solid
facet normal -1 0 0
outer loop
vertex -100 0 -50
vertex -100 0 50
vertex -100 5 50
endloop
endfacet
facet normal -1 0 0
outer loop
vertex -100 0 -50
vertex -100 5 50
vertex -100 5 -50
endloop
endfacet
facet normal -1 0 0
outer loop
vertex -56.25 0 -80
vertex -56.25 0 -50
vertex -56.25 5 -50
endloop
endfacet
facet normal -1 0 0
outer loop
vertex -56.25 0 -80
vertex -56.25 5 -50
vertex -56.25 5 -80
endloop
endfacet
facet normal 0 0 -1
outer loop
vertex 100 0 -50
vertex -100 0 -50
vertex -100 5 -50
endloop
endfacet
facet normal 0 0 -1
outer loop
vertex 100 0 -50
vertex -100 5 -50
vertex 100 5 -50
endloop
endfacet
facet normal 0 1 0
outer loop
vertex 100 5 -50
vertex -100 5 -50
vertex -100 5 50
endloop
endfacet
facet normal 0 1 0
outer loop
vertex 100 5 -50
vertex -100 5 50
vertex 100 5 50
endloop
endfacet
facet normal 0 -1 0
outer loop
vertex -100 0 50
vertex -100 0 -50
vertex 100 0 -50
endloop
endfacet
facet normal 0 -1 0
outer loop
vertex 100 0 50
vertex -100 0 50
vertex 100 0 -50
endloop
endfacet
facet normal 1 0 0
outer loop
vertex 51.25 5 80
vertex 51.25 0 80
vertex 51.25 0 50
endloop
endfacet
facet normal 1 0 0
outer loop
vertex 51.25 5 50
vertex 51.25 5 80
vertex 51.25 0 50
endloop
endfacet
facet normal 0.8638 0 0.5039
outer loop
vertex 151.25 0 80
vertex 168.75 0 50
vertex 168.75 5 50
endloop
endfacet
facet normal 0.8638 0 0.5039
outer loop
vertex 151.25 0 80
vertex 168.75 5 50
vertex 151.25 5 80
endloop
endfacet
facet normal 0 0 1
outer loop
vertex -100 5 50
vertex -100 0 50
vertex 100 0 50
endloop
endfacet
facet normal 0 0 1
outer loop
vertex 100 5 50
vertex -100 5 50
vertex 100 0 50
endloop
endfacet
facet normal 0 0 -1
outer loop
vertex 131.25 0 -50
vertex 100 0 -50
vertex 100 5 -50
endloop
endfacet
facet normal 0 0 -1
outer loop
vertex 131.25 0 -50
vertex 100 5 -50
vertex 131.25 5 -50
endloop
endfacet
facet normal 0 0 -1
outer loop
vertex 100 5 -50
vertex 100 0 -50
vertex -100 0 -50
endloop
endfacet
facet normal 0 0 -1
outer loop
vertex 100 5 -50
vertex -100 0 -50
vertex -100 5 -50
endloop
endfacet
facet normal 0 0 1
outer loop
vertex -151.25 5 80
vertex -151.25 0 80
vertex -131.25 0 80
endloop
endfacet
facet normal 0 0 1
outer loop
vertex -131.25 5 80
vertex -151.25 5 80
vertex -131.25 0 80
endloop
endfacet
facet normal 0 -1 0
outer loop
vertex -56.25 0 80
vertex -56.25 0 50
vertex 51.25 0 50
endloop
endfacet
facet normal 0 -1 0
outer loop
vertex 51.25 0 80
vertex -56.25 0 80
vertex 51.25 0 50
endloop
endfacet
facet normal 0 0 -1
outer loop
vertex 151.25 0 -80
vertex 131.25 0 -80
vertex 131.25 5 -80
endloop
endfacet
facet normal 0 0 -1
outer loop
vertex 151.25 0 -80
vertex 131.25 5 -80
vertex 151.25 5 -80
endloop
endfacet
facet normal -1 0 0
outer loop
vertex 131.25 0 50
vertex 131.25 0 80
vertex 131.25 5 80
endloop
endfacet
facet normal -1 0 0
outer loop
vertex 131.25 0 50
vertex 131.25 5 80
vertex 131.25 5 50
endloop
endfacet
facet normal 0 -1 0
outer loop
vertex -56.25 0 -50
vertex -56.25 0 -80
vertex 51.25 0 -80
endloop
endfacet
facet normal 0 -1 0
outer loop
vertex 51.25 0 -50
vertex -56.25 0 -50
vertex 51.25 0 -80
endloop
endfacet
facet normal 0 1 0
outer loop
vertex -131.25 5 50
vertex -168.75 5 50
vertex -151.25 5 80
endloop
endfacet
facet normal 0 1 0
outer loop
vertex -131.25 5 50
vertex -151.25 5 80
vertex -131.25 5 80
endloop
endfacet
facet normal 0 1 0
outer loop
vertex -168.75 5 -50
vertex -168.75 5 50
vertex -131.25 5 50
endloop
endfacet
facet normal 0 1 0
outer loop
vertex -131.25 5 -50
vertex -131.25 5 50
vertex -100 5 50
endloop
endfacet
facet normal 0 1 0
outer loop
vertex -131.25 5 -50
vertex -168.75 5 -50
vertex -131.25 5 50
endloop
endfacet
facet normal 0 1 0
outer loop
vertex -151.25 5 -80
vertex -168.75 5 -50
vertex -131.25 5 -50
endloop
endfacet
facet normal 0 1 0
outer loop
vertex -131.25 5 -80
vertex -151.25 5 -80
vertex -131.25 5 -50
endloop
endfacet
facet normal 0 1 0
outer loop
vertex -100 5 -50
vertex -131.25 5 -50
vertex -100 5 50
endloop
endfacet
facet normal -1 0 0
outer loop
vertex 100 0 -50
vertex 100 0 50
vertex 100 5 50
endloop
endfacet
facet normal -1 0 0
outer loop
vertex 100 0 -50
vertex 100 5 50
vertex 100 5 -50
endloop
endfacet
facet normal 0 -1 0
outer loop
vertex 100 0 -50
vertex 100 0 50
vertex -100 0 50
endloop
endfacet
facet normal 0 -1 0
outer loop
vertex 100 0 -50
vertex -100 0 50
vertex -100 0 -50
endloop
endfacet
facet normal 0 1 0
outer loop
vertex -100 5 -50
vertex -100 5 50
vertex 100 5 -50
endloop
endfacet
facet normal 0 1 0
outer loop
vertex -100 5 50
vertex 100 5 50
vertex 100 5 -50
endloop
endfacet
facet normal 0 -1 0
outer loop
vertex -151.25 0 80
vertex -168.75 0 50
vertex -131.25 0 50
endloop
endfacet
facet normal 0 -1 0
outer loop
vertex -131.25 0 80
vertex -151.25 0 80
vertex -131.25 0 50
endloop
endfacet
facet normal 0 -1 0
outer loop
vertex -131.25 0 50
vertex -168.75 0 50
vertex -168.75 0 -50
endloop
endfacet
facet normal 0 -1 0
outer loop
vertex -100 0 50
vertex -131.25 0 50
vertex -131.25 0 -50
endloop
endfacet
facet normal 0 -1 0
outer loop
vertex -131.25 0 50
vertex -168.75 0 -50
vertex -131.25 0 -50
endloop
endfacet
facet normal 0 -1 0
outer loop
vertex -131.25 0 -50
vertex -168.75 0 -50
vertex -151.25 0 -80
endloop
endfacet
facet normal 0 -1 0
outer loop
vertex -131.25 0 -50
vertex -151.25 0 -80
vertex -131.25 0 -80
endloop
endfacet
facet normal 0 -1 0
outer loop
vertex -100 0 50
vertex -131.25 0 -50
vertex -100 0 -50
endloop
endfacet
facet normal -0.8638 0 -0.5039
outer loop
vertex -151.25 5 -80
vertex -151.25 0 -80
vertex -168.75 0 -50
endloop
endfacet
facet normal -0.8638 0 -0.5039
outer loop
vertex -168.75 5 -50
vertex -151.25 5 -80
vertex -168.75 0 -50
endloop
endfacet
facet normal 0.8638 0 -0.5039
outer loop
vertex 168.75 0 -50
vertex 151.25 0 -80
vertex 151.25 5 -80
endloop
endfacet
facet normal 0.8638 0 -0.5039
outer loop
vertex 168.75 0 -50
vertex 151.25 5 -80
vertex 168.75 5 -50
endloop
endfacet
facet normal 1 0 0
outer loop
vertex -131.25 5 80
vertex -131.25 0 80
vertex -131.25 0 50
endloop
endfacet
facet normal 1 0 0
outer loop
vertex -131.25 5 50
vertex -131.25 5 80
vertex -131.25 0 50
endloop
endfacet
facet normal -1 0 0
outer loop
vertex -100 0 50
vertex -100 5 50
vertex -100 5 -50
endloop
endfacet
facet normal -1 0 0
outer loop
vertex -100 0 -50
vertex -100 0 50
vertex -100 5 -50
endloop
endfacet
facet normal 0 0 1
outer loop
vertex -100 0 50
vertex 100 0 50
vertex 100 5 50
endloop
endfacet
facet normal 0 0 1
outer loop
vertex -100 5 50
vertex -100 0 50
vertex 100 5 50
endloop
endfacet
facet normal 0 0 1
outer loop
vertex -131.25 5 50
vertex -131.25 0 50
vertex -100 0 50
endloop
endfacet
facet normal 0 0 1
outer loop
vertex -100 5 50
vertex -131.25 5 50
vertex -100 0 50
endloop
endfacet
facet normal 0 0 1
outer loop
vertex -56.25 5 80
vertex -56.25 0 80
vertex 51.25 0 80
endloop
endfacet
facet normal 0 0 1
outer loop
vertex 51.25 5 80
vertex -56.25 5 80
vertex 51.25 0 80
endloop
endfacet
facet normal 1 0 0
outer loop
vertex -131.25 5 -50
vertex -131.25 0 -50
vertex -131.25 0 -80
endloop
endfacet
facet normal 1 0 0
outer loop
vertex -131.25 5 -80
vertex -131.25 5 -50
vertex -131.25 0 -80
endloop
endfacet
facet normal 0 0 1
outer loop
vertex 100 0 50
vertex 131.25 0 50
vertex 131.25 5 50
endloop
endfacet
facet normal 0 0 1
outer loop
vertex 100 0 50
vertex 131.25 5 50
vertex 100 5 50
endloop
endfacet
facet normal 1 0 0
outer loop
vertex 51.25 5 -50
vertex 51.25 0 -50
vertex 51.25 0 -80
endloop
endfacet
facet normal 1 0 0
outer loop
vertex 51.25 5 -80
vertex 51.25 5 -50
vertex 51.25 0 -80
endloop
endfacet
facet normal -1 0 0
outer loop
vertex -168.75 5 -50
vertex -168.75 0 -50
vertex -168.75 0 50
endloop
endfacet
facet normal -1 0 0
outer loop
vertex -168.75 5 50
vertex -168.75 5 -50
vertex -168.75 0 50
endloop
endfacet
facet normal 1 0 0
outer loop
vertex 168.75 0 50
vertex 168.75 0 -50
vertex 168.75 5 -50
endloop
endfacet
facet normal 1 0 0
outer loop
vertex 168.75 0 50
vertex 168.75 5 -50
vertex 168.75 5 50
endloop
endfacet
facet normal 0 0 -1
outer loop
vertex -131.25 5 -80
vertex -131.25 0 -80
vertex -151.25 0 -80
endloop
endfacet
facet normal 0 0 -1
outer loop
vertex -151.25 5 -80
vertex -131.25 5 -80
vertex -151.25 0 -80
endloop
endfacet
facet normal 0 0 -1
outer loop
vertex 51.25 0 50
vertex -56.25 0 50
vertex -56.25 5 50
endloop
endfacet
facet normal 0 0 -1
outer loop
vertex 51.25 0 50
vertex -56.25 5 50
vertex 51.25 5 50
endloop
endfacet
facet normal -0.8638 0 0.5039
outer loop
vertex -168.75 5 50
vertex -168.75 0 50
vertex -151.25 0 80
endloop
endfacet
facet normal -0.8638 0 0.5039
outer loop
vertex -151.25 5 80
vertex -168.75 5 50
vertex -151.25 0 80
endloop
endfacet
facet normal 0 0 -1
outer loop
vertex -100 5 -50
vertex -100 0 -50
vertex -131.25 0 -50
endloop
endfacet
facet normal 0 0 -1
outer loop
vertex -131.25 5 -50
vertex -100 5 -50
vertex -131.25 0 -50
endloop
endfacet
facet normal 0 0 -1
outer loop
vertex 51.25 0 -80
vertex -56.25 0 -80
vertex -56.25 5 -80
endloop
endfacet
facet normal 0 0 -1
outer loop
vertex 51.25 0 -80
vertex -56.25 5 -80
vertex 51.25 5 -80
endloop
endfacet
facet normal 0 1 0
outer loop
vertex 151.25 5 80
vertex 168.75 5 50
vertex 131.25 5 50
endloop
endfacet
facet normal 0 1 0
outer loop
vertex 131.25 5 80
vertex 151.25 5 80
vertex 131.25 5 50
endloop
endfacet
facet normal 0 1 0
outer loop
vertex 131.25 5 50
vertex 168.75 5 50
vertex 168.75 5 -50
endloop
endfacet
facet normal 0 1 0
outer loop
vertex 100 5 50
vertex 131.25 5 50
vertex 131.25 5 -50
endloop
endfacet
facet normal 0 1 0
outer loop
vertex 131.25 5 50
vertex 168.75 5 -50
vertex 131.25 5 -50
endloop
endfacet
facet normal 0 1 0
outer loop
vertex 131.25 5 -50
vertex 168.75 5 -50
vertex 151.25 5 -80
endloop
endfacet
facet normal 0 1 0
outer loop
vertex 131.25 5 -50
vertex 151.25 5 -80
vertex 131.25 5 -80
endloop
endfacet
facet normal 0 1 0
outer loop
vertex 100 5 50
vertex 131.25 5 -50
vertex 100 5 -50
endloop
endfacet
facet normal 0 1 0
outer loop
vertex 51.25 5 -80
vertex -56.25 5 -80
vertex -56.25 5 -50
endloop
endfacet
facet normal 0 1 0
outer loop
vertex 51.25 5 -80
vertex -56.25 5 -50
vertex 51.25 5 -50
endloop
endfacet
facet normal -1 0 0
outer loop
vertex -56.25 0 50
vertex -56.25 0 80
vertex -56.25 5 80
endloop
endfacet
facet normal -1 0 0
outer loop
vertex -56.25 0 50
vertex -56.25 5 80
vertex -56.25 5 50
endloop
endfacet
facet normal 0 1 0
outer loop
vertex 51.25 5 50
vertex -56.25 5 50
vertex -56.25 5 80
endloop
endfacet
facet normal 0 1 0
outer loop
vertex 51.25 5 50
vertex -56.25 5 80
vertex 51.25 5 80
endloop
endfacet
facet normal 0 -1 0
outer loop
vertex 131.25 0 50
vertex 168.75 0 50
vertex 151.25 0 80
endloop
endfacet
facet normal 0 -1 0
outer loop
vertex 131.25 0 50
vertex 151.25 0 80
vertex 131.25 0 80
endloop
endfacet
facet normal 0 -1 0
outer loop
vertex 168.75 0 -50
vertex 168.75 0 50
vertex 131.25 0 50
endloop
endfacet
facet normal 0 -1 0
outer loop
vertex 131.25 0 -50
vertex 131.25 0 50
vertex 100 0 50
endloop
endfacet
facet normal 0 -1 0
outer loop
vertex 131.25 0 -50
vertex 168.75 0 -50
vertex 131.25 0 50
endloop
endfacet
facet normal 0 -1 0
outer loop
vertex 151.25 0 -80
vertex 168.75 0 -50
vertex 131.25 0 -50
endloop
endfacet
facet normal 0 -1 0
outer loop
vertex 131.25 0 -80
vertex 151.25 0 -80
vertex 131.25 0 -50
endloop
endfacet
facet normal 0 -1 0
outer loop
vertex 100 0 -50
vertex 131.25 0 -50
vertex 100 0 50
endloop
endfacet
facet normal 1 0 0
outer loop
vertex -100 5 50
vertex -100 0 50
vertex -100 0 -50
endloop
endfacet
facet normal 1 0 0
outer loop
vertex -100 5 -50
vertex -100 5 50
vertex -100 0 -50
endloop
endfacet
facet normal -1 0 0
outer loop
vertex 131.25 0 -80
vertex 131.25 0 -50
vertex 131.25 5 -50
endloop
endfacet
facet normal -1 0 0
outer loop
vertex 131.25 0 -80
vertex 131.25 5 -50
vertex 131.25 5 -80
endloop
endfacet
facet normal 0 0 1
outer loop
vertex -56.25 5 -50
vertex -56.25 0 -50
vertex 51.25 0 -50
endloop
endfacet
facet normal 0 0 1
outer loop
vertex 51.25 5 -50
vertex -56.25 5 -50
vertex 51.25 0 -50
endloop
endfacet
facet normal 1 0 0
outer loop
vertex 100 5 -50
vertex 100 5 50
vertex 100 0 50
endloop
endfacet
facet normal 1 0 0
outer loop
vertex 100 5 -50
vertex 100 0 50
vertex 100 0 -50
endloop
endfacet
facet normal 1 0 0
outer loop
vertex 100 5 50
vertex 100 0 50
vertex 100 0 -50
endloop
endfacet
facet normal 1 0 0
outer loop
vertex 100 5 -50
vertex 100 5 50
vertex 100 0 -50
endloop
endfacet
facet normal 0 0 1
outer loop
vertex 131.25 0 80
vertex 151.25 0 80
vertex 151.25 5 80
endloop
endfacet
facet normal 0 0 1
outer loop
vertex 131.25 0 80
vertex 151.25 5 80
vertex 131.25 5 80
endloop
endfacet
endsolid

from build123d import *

# Parameters (mm, degrees)
SKETCH1_W             = 200
SKETCH1_H             = 100
BOSS_EXTRUDE1_DEPTH   = 5
SKETCH3_W             = 200
SKETCH3_H             = 5
BOSS_EXTRUDE2_DEPTH   = 50
SKETCH4_W             = 100
SKETCH4_H             = 5
BOSS_EXTRUDE3_DEPTH   = 100
BOSS_EXTRUDE4_DEPTH   = 5
SKETCH6_W             = 107.5
SKETCH6_H             = 30
BOSS_EXTRUDE4_2_DEPTH = 5
BOSS_EXTRUDE4_3_DEPTH = 5
BOSS_EXTRUDE4_4_DEPTH = 5


with BuildPart() as part:
    # Sketch1 → Boss-Extrude1 (new body)
    with BuildSketch(Plane(origin=(0, 0, 0), x_dir=(1, 0, 0), z_dir=(0, 1, 0))):
        Rectangle(SKETCH1_W, SKETCH1_H)
    extrude(amount=BOSS_EXTRUDE1_DEPTH)

    # Sketch3 → Boss-Extrude2 (add, symmetric)
    with BuildSketch(Plane.XY):
        with Locations((0, 2.5)):
            Rectangle(SKETCH3_W, SKETCH3_H)
    extrude(amount=BOSS_EXTRUDE2_DEPTH, both=True)


with BuildPart() as body_2:
    # Sketch4 → Boss-Extrude3 (new, symmetric)
    with BuildSketch(Plane(origin=(0, 0, 0), x_dir=(0, 0, -1), z_dir=(1, 0, 0))):
        with Locations((0, 2.5)):
            Rectangle(SKETCH4_W, SKETCH4_H)
    extrude(amount=BOSS_EXTRUDE3_DEPTH, both=True)


with BuildPart() as body_3:
    # Sketch6 → Boss-Extrude4 (new body)
    with BuildSketch(Plane(origin=(0, 0, 0), x_dir=(1, 0, 0), z_dir=(0, 1, 0))):
        Polygon((-100, 50), (-131.25, 50), (-131.25, 80), (-151.25, 80), (-168.75, 50), (-168.75, -50), (-151.25, -80), (-131.25, -80), (-131.25, -50), (-100, -50), align=None)
    extrude(amount=BOSS_EXTRUDE4_DEPTH)


with BuildPart() as body_4:
    # Sketch6 → Boss-Extrude4 2 (new body)
    with BuildSketch(Plane(origin=(0, 0, 0), x_dir=(1, 0, 0), z_dir=(0, 1, 0))):
        with Locations((-2.5, -65)):
            Rectangle(SKETCH6_W, SKETCH6_H)
    extrude(amount=BOSS_EXTRUDE4_2_DEPTH)


with BuildPart() as body_5:
    # Sketch6 → Boss-Extrude4 3 (new body)
    with BuildSketch(Plane(origin=(0, 0, 0), x_dir=(1, 0, 0), z_dir=(0, 1, 0))):
        Polygon((100, 50), (131.25, 50), (131.25, 80), (151.25, 80), (168.75, 50), (168.75, -50), (151.25, -80), (131.25, -80), (131.25, -50), (100, -50), align=None)
    extrude(amount=BOSS_EXTRUDE4_3_DEPTH)


with BuildPart() as body_6:
    # Sketch6 → Boss-Extrude4 4 (new body)
    with BuildSketch(Plane(origin=(0, 0, 0), x_dir=(1, 0, 0), z_dir=(0, 1, 0))):
        with Locations((-2.5, 65)):
            Rectangle(SKETCH6_W, SKETCH6_H)
    extrude(amount=BOSS_EXTRUDE4_4_DEPTH)


solid = Compound([part.part, body_2.part, body_3.part, body_4.part, body_5.part, body_6.part])
